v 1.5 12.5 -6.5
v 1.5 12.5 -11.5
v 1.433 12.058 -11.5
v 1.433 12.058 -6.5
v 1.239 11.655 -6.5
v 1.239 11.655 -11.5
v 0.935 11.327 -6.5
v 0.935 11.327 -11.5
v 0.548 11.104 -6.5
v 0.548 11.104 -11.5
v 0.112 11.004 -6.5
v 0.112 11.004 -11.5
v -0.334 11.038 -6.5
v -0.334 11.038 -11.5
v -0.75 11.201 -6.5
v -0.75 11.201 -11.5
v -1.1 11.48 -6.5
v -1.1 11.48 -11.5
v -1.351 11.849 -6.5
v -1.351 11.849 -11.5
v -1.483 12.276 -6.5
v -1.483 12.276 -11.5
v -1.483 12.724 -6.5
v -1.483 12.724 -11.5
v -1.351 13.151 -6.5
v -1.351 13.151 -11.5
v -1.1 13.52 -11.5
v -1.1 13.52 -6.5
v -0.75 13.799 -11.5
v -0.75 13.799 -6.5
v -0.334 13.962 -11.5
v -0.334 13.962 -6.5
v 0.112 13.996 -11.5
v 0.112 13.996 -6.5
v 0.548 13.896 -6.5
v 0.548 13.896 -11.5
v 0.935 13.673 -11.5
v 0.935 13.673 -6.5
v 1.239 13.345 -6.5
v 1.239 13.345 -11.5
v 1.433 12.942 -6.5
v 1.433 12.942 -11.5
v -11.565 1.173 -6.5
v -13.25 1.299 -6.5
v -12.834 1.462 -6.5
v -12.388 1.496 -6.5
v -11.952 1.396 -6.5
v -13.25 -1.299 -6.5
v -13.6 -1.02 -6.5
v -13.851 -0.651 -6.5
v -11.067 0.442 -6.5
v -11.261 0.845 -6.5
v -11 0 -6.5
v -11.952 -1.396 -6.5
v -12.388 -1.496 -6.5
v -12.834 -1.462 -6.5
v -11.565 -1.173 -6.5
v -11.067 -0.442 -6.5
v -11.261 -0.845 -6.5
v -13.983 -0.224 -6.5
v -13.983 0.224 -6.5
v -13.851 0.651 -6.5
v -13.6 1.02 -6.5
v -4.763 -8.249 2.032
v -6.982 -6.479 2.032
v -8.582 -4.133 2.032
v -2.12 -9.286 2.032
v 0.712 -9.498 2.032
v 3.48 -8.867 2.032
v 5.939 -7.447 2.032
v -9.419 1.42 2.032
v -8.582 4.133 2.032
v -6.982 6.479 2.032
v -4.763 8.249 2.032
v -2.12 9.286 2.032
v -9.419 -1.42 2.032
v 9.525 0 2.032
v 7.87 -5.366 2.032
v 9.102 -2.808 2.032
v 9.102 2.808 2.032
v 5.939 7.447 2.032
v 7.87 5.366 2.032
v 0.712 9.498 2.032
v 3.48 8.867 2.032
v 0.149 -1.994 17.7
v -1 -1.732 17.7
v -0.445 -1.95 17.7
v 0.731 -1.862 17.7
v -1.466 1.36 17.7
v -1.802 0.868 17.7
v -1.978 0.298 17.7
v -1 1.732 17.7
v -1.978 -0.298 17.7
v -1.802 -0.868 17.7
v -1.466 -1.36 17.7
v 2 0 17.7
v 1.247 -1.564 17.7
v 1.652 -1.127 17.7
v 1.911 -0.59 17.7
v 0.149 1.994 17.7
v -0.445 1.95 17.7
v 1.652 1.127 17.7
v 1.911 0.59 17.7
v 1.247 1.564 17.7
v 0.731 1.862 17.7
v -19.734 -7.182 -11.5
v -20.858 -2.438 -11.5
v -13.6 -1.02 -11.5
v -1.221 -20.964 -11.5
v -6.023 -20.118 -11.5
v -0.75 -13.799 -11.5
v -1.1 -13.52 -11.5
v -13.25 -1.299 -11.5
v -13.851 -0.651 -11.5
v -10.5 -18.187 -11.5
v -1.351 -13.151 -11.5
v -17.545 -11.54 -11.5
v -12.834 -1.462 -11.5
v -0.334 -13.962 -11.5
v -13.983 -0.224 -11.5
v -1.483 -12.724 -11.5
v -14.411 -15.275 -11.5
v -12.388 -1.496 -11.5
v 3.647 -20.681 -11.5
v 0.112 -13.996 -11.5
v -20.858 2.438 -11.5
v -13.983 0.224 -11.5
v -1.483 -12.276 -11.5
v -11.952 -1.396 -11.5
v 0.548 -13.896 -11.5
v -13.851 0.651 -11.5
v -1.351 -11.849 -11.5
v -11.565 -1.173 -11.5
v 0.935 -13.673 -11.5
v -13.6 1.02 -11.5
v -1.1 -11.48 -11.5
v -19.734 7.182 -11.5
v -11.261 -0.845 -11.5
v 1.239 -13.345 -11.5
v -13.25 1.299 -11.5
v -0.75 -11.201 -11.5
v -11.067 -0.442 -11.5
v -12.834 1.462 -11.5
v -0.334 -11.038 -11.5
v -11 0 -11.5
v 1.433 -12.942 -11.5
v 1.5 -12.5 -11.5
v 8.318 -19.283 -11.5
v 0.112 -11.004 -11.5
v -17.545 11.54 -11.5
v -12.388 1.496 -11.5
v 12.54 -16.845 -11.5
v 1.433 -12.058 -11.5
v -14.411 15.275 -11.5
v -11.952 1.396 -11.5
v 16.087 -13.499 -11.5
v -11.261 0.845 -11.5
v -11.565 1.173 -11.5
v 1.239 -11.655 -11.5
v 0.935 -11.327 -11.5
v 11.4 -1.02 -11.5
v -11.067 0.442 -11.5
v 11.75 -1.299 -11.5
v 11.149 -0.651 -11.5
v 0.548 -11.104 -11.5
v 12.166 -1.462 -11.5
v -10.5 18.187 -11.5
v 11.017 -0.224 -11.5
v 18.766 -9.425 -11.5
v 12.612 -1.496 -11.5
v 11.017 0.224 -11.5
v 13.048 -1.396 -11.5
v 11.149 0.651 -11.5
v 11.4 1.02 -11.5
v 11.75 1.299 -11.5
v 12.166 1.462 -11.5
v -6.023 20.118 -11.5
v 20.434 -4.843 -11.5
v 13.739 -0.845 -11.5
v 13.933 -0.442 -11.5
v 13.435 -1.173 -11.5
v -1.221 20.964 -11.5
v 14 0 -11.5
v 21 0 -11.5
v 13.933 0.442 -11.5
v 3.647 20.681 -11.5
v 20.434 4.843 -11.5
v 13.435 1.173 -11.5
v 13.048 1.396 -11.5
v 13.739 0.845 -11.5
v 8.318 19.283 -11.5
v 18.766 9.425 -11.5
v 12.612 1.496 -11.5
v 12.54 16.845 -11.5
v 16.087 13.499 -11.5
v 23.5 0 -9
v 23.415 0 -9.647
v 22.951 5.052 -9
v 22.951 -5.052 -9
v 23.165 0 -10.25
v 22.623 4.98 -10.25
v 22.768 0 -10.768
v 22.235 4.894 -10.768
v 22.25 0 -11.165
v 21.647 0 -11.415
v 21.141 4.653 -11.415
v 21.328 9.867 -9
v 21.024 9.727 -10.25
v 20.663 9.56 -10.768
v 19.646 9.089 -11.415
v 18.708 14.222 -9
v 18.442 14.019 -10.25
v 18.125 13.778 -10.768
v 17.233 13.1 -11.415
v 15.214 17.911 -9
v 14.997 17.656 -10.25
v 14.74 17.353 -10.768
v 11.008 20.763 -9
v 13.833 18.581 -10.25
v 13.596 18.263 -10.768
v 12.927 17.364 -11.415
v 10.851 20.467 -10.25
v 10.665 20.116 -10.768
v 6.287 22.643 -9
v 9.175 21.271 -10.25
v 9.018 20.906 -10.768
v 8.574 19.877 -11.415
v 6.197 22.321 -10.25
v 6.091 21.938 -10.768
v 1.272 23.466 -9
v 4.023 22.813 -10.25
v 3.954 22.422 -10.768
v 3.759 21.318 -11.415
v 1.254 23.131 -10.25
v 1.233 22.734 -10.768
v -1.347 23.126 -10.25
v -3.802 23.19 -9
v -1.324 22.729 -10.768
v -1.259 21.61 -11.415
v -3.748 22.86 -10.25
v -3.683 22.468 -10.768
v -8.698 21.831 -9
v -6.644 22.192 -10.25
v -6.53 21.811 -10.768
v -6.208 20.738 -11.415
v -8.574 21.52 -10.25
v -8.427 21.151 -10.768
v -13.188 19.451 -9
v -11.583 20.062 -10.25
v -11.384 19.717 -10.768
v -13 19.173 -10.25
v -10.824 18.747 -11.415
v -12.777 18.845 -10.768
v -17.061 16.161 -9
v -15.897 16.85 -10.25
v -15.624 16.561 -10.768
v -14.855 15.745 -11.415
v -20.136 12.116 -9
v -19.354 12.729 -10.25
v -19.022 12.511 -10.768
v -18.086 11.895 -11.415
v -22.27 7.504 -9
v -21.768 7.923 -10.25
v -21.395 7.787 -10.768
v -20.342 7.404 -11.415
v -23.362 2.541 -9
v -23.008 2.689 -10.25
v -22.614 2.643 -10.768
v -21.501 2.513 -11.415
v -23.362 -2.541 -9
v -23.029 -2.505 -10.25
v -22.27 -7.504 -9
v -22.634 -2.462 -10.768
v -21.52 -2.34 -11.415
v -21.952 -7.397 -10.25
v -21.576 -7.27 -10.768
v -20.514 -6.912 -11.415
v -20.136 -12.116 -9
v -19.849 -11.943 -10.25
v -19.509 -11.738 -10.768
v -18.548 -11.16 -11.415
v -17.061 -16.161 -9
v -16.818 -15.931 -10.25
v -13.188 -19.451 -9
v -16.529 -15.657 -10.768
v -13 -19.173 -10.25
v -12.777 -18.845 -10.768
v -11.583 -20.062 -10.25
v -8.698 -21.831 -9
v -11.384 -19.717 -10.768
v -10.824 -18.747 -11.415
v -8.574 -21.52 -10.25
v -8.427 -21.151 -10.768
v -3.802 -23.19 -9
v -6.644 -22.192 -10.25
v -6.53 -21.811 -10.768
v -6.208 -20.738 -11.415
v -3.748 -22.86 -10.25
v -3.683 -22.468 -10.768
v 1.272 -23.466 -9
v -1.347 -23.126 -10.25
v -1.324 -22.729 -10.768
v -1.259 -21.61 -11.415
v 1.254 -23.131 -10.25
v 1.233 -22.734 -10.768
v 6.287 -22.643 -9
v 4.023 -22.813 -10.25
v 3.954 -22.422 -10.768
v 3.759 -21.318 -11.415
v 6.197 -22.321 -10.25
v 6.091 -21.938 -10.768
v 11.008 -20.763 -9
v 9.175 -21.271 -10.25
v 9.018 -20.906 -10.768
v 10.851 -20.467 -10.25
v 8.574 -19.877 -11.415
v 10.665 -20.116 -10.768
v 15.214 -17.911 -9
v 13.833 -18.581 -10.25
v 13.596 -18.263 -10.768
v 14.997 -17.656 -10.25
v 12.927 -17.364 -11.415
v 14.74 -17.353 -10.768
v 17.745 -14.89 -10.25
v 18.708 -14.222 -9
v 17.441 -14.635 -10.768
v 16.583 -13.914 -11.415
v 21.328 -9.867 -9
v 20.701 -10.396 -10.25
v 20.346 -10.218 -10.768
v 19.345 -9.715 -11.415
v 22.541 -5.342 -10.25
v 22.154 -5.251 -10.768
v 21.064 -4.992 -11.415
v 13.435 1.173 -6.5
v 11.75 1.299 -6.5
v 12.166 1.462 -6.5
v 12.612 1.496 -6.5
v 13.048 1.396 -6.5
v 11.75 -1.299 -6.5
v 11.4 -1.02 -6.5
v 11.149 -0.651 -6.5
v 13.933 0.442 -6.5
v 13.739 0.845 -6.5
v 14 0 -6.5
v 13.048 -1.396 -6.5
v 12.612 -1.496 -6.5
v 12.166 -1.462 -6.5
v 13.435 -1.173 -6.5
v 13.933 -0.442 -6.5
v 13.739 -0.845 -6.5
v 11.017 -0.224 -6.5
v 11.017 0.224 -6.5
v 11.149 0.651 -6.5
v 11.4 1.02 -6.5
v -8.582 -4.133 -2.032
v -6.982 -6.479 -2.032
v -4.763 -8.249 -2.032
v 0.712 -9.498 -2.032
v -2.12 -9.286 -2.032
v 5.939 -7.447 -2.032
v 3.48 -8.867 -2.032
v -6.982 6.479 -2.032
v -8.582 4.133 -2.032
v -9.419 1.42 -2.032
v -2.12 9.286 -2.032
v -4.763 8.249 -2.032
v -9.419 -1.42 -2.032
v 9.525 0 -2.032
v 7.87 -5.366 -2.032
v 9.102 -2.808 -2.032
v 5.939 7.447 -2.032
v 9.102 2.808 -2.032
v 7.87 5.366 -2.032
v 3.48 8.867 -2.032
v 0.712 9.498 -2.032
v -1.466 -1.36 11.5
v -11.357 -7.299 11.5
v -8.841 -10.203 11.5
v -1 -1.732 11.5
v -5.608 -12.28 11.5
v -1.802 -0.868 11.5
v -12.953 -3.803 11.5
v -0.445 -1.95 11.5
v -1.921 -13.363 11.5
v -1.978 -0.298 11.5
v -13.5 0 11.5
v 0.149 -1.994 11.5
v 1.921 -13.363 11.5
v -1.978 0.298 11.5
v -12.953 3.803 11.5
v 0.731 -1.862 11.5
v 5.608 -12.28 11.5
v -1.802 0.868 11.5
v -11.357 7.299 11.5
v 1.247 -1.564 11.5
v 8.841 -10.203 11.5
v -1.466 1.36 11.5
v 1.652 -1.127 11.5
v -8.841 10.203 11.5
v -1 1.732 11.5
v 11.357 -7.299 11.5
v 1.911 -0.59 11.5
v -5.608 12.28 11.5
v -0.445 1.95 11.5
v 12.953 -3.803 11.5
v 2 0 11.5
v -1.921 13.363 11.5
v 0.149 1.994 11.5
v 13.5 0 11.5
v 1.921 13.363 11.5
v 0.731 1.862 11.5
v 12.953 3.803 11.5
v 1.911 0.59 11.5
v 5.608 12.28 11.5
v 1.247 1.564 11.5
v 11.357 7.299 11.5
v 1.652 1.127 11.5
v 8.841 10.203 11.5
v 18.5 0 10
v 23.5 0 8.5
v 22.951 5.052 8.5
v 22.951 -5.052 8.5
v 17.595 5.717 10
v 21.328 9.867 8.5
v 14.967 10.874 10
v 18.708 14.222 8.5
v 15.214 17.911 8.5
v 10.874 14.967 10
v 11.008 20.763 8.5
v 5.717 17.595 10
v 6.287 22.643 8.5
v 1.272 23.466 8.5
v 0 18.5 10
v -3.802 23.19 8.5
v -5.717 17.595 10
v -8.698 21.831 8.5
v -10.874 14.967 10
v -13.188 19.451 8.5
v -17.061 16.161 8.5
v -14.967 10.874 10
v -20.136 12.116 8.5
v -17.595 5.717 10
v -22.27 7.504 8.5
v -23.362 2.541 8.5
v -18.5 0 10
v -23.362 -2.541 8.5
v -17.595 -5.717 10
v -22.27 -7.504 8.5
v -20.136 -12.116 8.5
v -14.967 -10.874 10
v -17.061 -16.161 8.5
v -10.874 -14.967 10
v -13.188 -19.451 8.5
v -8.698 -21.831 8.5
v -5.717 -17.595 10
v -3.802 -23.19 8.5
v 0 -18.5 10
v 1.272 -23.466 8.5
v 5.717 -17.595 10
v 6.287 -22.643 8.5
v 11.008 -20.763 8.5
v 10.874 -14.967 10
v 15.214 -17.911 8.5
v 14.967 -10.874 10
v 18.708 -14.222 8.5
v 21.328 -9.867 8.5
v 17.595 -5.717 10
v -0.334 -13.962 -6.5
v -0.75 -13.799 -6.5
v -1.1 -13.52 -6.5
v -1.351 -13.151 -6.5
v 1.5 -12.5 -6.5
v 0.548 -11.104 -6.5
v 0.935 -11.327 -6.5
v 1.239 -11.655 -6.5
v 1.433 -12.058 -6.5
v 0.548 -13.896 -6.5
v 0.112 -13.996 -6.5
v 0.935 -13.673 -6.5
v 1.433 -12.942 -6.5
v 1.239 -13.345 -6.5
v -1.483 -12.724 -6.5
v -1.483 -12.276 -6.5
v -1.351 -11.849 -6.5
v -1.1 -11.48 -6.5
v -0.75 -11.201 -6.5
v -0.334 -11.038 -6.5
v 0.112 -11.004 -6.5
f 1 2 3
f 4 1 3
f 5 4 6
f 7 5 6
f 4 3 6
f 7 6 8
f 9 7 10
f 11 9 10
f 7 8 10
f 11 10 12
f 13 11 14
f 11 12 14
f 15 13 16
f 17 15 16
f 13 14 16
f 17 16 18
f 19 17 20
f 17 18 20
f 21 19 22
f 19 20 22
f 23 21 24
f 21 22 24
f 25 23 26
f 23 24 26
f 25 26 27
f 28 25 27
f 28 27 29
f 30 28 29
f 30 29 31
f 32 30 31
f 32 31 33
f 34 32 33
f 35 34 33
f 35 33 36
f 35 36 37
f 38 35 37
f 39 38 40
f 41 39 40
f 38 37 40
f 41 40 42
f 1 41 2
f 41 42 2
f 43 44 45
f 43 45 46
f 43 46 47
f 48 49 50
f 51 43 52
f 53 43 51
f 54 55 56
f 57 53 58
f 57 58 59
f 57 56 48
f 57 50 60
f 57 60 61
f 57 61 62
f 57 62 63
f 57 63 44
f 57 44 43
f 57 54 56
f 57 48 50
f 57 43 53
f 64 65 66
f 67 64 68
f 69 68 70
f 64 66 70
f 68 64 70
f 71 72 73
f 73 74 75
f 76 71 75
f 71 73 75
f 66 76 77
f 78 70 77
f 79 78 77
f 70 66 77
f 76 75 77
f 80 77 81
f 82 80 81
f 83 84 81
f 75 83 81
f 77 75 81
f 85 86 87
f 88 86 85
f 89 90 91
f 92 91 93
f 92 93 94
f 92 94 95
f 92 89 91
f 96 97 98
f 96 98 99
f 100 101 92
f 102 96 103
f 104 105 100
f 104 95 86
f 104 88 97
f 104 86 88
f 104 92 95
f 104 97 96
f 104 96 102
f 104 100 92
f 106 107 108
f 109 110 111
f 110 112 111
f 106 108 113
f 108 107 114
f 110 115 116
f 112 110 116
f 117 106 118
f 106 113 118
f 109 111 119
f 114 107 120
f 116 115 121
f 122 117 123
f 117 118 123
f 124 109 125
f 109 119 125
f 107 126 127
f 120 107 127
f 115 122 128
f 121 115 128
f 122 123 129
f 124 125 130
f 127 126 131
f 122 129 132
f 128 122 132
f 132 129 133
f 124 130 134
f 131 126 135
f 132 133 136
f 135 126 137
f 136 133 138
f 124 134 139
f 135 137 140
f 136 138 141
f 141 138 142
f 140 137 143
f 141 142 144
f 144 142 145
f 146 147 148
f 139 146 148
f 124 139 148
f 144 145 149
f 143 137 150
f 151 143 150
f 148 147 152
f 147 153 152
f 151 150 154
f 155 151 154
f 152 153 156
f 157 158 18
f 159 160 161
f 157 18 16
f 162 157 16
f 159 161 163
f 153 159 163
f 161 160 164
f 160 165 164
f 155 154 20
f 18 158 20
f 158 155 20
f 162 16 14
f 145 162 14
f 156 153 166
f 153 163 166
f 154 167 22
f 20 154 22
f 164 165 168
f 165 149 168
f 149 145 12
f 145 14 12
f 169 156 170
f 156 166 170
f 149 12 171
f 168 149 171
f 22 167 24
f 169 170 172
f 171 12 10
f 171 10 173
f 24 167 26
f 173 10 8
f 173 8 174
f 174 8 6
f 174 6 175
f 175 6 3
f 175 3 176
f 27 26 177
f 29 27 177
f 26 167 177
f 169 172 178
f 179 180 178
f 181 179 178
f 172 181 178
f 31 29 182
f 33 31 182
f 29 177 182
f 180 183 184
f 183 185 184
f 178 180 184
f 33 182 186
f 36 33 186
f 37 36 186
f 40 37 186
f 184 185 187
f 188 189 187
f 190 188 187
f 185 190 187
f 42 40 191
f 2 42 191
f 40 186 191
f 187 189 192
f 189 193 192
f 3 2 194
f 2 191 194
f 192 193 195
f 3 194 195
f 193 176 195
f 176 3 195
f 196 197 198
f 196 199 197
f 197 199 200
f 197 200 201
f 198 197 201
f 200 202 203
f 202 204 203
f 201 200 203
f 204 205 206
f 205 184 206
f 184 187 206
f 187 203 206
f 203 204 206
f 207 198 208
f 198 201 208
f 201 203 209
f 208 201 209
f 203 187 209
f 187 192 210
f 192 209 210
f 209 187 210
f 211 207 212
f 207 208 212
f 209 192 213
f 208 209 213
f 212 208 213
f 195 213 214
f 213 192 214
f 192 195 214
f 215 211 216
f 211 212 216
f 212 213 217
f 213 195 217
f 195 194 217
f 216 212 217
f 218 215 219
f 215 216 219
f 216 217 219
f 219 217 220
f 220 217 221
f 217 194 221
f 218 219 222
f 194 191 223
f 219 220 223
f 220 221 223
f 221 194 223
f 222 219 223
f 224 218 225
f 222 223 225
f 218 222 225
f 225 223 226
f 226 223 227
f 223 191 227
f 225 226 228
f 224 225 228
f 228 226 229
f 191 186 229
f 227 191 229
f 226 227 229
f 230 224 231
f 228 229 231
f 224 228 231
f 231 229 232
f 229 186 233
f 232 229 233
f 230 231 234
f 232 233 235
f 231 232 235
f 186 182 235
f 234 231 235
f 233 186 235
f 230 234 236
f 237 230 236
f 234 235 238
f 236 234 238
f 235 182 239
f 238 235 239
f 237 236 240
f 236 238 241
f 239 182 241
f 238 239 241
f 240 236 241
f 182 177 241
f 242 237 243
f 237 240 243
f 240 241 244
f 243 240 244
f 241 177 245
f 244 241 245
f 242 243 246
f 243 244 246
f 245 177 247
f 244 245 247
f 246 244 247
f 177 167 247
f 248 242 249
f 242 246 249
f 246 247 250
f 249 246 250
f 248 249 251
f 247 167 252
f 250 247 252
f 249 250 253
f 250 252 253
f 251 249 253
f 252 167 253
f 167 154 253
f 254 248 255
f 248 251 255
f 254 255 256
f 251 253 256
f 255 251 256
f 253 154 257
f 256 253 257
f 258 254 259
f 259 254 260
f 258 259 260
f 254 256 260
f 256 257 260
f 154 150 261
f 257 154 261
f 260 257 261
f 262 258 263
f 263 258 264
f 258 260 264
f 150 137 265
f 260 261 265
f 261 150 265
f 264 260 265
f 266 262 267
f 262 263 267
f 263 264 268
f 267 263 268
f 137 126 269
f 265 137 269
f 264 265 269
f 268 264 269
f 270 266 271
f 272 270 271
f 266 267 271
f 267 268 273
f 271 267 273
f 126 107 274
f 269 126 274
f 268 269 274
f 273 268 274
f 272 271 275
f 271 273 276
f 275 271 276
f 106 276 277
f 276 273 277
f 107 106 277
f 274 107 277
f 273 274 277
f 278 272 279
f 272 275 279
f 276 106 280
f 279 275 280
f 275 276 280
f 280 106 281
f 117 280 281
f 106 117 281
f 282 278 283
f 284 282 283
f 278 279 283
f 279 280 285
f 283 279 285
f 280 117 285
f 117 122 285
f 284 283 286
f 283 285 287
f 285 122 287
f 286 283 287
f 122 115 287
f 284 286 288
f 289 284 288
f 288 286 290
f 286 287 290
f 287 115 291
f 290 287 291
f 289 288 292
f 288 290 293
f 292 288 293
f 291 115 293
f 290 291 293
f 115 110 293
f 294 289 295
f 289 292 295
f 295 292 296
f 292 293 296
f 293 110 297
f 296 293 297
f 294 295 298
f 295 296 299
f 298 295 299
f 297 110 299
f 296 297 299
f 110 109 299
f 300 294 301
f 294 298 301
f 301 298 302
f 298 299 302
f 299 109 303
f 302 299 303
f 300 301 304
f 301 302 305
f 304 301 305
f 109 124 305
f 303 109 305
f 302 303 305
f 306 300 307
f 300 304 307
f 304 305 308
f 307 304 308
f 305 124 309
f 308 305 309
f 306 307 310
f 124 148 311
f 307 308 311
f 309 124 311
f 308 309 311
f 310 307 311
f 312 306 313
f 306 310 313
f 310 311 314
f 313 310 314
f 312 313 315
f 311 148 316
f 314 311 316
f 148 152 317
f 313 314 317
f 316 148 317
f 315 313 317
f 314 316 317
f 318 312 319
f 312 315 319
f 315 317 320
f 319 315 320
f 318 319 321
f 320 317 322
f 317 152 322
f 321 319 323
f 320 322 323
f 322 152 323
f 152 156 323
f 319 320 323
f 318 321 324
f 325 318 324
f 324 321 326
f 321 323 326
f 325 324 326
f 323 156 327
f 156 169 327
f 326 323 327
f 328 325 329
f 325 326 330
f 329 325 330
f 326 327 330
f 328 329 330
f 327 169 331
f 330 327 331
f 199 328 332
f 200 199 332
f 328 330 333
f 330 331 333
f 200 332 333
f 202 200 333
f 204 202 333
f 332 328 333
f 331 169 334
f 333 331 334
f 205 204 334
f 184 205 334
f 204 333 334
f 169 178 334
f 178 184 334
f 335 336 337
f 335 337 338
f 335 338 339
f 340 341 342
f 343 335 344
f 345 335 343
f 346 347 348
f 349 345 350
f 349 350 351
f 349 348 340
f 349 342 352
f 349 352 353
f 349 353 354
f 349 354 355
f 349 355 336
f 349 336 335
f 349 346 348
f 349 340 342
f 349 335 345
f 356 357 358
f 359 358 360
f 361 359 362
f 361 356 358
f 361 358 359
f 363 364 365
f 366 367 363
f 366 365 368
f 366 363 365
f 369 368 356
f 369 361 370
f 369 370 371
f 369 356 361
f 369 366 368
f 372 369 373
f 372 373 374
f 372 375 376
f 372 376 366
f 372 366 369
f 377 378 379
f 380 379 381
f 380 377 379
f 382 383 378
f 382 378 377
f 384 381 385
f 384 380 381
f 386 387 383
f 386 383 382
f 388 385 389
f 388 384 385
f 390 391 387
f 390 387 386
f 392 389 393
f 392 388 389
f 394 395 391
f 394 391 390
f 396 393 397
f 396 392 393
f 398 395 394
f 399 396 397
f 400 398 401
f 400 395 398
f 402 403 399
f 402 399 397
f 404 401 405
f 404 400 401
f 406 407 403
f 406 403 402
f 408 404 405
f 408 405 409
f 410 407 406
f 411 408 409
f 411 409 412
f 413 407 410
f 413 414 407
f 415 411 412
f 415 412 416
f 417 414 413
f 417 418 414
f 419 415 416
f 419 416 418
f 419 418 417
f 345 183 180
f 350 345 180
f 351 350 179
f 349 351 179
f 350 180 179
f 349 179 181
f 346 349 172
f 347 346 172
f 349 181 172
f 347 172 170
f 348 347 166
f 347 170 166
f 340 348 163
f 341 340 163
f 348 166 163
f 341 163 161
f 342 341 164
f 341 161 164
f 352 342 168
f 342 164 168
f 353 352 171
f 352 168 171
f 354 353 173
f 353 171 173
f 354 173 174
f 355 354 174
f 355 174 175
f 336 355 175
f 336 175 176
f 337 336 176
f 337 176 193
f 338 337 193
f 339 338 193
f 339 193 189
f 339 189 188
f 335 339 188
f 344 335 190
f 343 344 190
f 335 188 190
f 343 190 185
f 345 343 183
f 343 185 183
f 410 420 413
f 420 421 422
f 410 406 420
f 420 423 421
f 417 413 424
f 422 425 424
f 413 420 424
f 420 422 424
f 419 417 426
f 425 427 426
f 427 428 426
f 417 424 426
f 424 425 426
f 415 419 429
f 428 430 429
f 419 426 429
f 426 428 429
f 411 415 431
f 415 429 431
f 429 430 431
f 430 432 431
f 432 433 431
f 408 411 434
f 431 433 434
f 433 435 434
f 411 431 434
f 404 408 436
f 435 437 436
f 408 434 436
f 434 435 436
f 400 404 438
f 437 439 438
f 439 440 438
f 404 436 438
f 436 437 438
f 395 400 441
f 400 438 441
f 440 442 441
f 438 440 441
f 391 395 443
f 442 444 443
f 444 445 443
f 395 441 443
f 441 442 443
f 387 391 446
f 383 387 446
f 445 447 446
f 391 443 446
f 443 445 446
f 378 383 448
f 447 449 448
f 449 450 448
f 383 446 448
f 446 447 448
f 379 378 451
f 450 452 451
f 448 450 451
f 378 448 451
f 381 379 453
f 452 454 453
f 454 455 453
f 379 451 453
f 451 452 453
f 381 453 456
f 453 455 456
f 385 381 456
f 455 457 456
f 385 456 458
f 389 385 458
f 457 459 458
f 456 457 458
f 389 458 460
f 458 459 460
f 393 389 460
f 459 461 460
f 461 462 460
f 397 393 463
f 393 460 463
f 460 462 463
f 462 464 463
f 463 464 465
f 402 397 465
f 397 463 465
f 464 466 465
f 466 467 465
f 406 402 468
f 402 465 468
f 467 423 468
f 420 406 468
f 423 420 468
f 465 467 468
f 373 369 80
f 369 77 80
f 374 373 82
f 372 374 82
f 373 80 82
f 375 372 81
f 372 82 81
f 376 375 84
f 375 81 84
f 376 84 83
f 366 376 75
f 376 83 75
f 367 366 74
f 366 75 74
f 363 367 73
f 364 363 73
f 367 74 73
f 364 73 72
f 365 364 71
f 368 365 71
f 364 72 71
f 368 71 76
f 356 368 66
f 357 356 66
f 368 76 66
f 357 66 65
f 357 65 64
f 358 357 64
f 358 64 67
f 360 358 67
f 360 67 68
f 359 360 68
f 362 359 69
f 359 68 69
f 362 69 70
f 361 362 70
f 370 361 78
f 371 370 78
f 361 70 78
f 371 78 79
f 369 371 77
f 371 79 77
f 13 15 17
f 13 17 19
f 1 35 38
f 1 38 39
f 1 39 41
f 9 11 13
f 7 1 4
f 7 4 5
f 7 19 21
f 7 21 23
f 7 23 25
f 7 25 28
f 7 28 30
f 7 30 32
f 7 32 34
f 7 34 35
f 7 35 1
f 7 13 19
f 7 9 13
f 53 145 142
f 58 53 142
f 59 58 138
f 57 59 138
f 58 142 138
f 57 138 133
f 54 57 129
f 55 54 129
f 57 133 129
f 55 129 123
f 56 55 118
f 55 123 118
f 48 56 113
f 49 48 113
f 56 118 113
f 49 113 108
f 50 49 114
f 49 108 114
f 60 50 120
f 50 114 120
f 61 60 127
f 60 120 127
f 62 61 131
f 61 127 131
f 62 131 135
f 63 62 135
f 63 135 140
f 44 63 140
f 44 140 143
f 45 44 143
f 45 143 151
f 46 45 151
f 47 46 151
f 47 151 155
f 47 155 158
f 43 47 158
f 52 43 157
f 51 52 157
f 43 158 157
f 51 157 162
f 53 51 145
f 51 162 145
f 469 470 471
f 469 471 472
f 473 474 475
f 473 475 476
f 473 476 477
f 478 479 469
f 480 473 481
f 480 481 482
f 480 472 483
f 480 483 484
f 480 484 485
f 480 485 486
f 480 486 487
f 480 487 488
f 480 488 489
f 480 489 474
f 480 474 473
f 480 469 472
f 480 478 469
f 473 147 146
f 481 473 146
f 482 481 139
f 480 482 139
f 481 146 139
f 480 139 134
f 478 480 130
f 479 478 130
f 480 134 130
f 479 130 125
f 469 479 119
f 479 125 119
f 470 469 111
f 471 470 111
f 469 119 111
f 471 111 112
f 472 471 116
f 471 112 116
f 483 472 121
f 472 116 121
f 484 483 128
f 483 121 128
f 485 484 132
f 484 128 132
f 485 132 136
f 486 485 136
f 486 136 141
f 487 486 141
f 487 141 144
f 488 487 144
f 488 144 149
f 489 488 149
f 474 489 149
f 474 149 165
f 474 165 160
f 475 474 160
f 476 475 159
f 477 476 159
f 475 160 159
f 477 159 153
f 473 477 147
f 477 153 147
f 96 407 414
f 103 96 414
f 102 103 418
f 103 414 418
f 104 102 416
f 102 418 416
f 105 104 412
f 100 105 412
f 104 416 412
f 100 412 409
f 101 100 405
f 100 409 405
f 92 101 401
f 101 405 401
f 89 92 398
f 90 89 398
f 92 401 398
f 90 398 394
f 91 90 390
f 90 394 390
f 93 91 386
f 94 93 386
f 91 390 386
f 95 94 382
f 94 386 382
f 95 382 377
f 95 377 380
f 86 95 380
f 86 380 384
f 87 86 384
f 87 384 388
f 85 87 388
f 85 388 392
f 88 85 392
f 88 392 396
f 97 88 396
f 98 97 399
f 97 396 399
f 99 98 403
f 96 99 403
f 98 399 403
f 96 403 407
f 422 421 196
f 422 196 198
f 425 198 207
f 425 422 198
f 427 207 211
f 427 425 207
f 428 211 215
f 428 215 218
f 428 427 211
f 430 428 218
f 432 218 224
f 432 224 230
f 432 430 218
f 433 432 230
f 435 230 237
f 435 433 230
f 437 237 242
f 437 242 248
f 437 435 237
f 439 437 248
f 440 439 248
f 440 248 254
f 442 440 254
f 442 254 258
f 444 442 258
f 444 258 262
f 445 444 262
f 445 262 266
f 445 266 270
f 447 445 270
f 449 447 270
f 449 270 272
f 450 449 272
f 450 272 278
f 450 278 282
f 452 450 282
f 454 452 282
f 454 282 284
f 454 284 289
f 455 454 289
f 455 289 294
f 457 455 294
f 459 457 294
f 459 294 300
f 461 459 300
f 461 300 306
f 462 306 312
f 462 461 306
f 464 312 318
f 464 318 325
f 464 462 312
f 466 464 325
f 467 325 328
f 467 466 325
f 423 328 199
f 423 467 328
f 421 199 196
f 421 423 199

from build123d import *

# Parameters (mm, degrees)
F0_R     = 23.5
F1_DEPTH = 11.5
F2_R     = 2
F3_DEPTH = 6.2
F4_R     = 1.5
F5_DEPTH = 5
F6_SIZE2 = 3
F6_SIZE  = 10
F7_R     = 2.5
F8_R     = 9.525
F9_DEPTH = 2.032


with BuildPart() as f1:
    # F0 (on Top) → F1 (new body, symmetric)
    with BuildSketch(Plane.XY):
        Circle(F0_R)
    extrude(amount=F1_DEPTH, both=True)

    # F2 (on face) → F3 (join)
    with BuildSketch(Plane.XY.offset(11.5)):
        Circle(F2_R)
    extrude(amount=F3_DEPTH)

    # F4 (on face) → F5 (cut)
    with BuildSketch(Plane(origin=(0, 0, -11.5), x_dir=(1, 0, 0), z_dir=(0, 0, -1))):
        with Locations((0, 12.5)):
            Circle(F4_R)
        with Locations((-12.5, 0)):
            Circle(F4_R)
        with Locations((0, -12.5)):
            Circle(F4_R)
        with Locations((12.5, 0)):
            Circle(F4_R)
    extrude(amount=-F5_DEPTH, mode=Mode.SUBTRACT)

    # F6
    f6_edges = [f1.edges().sort_by_distance(p)[0] for p in [
        (-23.5, 0, 11.5),
    ]]
    f6_side = f1.faces().sort_by_distance((-22.83532, 0, 11.5))[0]
    chamfer(f6_edges, length=F6_SIZE, length2=F6_SIZE2, reference=f6_side)

    # F7
    f7_edges = [f1.edges().sort_by_distance(p)[0] for p in [
        (-23.5, 0, -11.5),
    ]]
    fillet(f7_edges, radius=F7_R)

    # F8 (on Top) → F9 (cut, symmetric)
    with BuildSketch(Plane.XY):
        Circle(F8_R)
    extrude(amount=F9_DEPTH, both=True, mode=Mode.SUBTRACT)


solid = f1.part
